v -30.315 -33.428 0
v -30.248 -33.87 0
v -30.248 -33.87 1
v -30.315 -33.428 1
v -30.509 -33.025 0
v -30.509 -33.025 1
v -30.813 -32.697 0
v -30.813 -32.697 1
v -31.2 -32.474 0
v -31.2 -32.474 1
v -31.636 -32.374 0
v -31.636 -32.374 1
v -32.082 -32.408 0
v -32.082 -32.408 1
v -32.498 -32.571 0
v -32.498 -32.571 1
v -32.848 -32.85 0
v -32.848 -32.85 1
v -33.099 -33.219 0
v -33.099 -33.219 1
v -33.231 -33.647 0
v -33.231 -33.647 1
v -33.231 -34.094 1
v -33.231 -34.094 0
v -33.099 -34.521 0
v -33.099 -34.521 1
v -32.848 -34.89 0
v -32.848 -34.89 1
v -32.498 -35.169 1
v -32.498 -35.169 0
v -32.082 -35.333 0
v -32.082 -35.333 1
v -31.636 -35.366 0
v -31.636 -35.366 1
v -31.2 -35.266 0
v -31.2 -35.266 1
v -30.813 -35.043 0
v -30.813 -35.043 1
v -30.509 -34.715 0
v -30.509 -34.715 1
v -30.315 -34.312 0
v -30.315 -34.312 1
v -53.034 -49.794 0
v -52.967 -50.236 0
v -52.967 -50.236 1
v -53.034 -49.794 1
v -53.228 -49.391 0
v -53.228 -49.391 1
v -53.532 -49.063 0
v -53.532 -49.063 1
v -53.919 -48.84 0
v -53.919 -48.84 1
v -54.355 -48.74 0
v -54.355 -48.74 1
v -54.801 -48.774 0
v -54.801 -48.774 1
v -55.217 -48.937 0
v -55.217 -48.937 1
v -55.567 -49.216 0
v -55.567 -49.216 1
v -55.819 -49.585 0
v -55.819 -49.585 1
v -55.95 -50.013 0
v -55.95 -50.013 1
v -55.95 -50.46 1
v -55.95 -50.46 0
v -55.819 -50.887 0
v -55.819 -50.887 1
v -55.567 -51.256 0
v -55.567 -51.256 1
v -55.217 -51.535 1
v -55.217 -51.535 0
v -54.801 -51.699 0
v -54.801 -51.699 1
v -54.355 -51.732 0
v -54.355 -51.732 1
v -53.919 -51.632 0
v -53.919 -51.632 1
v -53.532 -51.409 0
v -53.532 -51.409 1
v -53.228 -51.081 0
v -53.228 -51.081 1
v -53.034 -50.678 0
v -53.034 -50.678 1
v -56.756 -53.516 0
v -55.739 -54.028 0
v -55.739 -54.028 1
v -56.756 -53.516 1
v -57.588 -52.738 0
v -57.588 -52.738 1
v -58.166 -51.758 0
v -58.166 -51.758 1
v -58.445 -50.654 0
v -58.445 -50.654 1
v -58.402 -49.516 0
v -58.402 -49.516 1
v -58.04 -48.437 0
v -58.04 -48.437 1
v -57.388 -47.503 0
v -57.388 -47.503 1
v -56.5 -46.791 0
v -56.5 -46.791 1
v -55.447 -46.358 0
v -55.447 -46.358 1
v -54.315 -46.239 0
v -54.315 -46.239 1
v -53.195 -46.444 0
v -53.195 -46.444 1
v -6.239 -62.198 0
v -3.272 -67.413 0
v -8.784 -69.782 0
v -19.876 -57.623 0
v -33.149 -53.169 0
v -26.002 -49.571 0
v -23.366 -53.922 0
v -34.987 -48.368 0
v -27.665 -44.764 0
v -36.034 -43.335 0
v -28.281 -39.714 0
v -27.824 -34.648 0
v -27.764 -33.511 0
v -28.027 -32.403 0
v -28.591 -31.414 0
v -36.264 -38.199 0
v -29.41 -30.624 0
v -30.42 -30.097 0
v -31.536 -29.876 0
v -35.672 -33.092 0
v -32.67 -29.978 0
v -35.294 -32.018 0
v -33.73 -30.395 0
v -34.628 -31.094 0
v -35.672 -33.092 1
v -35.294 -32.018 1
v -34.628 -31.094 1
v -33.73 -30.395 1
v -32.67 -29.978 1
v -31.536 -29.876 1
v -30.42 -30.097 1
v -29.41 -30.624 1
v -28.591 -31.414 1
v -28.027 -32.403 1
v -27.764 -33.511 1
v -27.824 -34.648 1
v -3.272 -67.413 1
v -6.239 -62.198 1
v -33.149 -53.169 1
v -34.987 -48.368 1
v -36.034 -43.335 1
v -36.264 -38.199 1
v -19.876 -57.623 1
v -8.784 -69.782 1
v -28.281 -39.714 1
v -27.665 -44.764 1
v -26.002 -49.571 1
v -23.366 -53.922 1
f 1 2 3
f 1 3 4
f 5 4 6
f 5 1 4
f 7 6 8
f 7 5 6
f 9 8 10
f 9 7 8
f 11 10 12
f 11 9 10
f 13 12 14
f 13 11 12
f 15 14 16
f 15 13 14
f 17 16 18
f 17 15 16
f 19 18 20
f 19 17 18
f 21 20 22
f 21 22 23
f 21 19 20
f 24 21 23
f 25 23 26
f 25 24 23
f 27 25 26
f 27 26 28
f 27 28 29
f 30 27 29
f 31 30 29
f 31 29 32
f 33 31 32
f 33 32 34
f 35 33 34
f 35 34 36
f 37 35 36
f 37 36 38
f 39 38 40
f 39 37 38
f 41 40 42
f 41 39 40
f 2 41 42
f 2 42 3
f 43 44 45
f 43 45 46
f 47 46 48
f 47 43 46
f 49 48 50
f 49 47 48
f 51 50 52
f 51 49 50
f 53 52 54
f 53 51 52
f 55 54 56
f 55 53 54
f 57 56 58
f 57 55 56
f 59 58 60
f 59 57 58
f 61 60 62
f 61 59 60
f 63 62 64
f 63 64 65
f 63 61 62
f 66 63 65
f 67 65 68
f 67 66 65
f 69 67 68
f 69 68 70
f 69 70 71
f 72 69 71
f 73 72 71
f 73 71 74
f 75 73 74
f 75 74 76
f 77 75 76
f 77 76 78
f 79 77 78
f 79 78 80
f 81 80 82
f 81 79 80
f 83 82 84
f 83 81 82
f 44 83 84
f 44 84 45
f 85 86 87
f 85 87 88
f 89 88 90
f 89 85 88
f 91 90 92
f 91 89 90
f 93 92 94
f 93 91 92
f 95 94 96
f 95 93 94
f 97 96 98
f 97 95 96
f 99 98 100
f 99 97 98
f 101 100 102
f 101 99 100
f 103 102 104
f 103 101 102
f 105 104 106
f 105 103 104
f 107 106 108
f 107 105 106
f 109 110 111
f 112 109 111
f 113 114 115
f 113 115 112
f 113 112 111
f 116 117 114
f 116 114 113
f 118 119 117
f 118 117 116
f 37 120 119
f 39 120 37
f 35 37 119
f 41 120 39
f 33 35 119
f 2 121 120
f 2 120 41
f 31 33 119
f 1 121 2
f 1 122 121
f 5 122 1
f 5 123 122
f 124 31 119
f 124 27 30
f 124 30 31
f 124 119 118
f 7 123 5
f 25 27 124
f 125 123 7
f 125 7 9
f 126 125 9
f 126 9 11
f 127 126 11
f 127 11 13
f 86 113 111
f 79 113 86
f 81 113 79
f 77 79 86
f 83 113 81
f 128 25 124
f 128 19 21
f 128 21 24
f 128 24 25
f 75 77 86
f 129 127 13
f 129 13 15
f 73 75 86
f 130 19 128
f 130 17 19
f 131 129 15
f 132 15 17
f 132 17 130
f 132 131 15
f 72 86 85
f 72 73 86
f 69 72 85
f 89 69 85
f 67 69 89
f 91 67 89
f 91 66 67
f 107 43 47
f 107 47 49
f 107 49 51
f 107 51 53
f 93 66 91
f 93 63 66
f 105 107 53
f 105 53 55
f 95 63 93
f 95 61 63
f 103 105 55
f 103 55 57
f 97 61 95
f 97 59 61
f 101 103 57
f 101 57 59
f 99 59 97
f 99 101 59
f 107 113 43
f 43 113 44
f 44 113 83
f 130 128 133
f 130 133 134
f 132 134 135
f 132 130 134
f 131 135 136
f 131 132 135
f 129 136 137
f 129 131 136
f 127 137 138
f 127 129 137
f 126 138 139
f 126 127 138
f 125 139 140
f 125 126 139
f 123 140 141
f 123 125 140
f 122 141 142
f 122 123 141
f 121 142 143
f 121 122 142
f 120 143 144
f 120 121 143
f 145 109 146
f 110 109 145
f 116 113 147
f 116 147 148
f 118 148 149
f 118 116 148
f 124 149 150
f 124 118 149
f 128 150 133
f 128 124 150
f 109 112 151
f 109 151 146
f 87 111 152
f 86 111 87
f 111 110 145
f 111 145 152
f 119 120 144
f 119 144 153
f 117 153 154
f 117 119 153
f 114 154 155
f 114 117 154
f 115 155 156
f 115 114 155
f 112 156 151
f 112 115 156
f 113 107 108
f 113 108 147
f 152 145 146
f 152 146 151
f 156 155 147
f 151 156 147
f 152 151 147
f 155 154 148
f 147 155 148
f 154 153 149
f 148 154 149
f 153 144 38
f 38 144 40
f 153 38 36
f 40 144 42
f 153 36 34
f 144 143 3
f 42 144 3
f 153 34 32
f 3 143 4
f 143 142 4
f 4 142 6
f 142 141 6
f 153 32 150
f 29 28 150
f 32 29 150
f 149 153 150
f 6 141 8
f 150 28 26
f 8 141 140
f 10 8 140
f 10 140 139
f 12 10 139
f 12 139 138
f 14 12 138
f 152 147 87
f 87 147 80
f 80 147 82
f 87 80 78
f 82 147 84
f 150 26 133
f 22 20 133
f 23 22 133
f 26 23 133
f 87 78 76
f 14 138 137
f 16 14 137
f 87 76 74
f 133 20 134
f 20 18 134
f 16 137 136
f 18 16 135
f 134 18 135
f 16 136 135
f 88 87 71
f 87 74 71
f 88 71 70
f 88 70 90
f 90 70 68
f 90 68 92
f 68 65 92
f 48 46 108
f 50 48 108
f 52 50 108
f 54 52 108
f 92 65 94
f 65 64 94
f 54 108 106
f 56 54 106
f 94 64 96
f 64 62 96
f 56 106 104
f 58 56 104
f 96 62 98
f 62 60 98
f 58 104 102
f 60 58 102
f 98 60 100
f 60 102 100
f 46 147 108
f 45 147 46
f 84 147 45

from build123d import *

# Parameters (mm, degrees)
ESQUISSE1_R               = 1.5
T_LE_DE_BASE_PLI_E1_DEPTH = 1


# Sheet-metal steps are written as plain solids
with BuildPart() as part:
    # Esquisse1 → Tôle de base pliée1 (new body)
    with BuildSketch(Plane.XY):
        with BuildLine():
            Line((-53.194732382, -46.443882138), (-33.149125492, -53.169374239))
            ThreePointArc((-33.149125492, -53.169374239), (-36.034099594, -43.334809734), (-35.67163719, -33.092234102))
            ThreePointArc((-35.67163719, -33.092234102), (-30.970075892, -29.94655113), (-27.82439292, -34.648112428))
            ThreePointArc((-27.82439292, -34.648112428), (-26.960351912, -47.211264855), (-19.876250068, -57.622550405))
            Line((-19.876250068, -57.622550405), (-6.239220274, -62.197903832))
            Line((-6.239220274, -62.197903832), (-3.271691792, -67.412668899))
            Line((-3.271691792, -67.412668899), (-8.783892369, -69.782404075))
            Line((-8.783892369, -69.782404075), (-55.739404477, -54.02838238))
            ThreePointArc((-55.739404477, -54.02838238), (-58.259318551, -48.963796212), (-53.194732382, -46.443882138))
        make_face()
        with Locations((-54.467068429, -50.236132259)):
            Circle(ESQUISSE1_R, mode=Mode.SUBTRACT)
        with Locations((-31.748015055, -33.870173265)):
            Circle(ESQUISSE1_R, mode=Mode.SUBTRACT)
    extrude(amount=T_LE_DE_BASE_PLI_E1_DEPTH)


solid = part.part
